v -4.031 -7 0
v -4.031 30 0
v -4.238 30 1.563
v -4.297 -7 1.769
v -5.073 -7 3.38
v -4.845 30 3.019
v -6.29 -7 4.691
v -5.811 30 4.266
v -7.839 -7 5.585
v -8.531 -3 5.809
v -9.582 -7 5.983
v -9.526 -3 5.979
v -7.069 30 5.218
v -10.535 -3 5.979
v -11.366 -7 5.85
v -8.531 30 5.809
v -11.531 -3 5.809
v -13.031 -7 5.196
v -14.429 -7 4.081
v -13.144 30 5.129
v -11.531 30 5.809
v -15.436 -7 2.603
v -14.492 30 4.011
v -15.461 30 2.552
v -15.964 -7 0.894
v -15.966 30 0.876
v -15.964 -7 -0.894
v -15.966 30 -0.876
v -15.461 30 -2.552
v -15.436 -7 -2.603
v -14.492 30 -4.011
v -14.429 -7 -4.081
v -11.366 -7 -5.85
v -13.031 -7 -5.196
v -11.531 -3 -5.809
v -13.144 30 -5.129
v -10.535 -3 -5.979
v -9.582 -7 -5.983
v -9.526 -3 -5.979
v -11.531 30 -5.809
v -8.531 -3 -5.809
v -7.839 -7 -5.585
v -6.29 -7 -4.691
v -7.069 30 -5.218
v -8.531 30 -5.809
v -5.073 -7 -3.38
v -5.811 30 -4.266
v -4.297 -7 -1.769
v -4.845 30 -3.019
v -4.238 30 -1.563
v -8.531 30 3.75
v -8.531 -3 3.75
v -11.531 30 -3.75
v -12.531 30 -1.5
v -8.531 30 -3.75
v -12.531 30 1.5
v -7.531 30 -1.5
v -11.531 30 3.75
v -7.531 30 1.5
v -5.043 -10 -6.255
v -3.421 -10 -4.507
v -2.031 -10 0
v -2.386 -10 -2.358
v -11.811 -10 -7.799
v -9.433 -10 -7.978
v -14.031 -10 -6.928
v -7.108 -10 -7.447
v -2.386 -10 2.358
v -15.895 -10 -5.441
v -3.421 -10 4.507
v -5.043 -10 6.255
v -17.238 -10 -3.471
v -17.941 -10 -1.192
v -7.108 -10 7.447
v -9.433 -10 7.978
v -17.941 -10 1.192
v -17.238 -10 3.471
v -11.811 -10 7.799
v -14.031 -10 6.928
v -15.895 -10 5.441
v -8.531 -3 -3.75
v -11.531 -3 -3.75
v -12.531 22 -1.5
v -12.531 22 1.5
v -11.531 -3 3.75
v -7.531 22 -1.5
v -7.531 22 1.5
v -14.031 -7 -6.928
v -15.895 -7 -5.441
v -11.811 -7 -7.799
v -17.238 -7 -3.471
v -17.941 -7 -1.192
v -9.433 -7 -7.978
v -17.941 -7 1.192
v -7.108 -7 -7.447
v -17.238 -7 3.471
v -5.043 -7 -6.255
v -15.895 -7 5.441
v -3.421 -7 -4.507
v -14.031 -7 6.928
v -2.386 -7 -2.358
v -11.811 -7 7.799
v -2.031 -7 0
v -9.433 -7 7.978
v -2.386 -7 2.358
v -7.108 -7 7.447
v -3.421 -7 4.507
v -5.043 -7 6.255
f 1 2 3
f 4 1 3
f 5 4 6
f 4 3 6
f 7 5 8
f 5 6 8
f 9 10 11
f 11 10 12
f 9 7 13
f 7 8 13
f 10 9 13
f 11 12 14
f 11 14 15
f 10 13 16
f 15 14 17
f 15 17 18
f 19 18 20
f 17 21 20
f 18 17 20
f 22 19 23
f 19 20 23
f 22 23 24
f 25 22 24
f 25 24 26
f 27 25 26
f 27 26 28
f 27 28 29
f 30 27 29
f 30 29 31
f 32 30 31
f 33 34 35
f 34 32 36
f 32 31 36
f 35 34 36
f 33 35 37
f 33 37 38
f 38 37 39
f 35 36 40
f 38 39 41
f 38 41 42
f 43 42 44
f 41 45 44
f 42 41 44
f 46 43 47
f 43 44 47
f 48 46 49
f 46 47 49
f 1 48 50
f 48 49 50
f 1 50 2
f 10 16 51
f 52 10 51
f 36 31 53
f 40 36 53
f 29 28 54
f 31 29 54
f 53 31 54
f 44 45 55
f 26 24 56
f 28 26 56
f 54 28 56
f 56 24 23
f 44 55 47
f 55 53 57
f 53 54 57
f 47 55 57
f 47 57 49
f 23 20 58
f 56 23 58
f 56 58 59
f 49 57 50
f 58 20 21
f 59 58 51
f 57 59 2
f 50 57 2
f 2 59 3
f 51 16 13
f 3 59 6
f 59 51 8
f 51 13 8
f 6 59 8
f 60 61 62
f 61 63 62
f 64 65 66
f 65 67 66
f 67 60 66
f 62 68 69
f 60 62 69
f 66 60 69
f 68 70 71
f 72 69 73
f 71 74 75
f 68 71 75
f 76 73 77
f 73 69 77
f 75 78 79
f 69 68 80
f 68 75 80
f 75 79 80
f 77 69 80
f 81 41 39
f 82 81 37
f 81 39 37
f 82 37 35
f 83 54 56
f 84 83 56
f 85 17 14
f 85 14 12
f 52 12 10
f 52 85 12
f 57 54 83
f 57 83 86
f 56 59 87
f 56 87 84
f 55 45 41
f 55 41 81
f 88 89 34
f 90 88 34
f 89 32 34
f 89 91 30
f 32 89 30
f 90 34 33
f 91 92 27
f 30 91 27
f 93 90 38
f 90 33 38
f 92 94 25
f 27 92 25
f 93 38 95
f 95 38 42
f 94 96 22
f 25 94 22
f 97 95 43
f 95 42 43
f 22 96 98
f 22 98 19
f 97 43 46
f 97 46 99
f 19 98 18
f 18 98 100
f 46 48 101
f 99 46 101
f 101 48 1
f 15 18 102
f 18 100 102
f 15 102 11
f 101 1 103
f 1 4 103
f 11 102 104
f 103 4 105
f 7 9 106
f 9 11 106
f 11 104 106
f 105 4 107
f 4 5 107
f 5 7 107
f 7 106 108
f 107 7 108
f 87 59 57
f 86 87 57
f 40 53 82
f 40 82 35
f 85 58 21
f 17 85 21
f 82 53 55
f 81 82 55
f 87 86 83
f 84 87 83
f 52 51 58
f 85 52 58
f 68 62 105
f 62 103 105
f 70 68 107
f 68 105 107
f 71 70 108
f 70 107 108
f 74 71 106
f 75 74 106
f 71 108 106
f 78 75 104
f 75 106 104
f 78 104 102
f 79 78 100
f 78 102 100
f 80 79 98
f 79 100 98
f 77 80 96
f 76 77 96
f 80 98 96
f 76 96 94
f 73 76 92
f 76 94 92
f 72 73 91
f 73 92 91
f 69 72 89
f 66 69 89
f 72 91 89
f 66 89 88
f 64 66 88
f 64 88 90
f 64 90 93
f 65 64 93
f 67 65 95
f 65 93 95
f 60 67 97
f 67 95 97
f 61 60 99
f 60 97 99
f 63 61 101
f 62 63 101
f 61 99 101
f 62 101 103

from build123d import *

# Parameters (mm, degrees)
ENL_V_MAT_EXTRU_4_DEPTH = 8
ENL_V_MAT_EXTRU_5_DEPTH = 33


with BuildPart() as part:
    # Esquisse4 → Révolution1 (revolve)
    with BuildSketch(Plane.XY):
        Polygon((-10.030612245, 30), (-10.030612245, -10), (-2.030612245, -10), (-2.030612245, -7), (-4.030612245, -7), (-4.030612245, 30), align=None)
    revolve(axis=Axis((-10.030612245, 30, 0), (0, -1, 0)))

    # Esquisse9 → Enlèv. mat.-Extru.4 (cut)
    with BuildSketch(Plane(origin=(0, 30, 0), x_dir=(1, 0, 0), z_dir=(0, 1, 0))):
        Polygon((-12.530612245, 1.5), (-7.530612245, 1.5), (-7.530612245, 0.5), (-7.530612245, -0.5), (-7.530612245, -1.5), (-12.530612245, -1.5), (-12.530612245, -0.5), (-12.530612245, 0.5), align=None)
    extrude(amount=-ENL_V_MAT_EXTRU_4_DEPTH, mode=Mode.SUBTRACT)

    # Esquisse11 → Enlèv. mat.-Extru.5 (cut)
    with BuildSketch(Plane(origin=(0, 30, 0), x_dir=(1, 0, 0), z_dir=(0, 1, 0))):
        Polygon((-10.030612245, 3.75), (-11.530612245, 3.75), (-11.530612245, 6.147265129), (-8.530612245, 6.147265129), (-8.530612245, 3.75), align=None)
        Polygon((-8.530612245, -3.75), (-10.030612245, -3.75), (-11.530612245, -3.75), (-11.530612245, -6.147265129), (-8.530612245, -6.147265129), align=None)
    extrude(amount=-ENL_V_MAT_EXTRU_5_DEPTH, mode=Mode.SUBTRACT)


solid = part.part
